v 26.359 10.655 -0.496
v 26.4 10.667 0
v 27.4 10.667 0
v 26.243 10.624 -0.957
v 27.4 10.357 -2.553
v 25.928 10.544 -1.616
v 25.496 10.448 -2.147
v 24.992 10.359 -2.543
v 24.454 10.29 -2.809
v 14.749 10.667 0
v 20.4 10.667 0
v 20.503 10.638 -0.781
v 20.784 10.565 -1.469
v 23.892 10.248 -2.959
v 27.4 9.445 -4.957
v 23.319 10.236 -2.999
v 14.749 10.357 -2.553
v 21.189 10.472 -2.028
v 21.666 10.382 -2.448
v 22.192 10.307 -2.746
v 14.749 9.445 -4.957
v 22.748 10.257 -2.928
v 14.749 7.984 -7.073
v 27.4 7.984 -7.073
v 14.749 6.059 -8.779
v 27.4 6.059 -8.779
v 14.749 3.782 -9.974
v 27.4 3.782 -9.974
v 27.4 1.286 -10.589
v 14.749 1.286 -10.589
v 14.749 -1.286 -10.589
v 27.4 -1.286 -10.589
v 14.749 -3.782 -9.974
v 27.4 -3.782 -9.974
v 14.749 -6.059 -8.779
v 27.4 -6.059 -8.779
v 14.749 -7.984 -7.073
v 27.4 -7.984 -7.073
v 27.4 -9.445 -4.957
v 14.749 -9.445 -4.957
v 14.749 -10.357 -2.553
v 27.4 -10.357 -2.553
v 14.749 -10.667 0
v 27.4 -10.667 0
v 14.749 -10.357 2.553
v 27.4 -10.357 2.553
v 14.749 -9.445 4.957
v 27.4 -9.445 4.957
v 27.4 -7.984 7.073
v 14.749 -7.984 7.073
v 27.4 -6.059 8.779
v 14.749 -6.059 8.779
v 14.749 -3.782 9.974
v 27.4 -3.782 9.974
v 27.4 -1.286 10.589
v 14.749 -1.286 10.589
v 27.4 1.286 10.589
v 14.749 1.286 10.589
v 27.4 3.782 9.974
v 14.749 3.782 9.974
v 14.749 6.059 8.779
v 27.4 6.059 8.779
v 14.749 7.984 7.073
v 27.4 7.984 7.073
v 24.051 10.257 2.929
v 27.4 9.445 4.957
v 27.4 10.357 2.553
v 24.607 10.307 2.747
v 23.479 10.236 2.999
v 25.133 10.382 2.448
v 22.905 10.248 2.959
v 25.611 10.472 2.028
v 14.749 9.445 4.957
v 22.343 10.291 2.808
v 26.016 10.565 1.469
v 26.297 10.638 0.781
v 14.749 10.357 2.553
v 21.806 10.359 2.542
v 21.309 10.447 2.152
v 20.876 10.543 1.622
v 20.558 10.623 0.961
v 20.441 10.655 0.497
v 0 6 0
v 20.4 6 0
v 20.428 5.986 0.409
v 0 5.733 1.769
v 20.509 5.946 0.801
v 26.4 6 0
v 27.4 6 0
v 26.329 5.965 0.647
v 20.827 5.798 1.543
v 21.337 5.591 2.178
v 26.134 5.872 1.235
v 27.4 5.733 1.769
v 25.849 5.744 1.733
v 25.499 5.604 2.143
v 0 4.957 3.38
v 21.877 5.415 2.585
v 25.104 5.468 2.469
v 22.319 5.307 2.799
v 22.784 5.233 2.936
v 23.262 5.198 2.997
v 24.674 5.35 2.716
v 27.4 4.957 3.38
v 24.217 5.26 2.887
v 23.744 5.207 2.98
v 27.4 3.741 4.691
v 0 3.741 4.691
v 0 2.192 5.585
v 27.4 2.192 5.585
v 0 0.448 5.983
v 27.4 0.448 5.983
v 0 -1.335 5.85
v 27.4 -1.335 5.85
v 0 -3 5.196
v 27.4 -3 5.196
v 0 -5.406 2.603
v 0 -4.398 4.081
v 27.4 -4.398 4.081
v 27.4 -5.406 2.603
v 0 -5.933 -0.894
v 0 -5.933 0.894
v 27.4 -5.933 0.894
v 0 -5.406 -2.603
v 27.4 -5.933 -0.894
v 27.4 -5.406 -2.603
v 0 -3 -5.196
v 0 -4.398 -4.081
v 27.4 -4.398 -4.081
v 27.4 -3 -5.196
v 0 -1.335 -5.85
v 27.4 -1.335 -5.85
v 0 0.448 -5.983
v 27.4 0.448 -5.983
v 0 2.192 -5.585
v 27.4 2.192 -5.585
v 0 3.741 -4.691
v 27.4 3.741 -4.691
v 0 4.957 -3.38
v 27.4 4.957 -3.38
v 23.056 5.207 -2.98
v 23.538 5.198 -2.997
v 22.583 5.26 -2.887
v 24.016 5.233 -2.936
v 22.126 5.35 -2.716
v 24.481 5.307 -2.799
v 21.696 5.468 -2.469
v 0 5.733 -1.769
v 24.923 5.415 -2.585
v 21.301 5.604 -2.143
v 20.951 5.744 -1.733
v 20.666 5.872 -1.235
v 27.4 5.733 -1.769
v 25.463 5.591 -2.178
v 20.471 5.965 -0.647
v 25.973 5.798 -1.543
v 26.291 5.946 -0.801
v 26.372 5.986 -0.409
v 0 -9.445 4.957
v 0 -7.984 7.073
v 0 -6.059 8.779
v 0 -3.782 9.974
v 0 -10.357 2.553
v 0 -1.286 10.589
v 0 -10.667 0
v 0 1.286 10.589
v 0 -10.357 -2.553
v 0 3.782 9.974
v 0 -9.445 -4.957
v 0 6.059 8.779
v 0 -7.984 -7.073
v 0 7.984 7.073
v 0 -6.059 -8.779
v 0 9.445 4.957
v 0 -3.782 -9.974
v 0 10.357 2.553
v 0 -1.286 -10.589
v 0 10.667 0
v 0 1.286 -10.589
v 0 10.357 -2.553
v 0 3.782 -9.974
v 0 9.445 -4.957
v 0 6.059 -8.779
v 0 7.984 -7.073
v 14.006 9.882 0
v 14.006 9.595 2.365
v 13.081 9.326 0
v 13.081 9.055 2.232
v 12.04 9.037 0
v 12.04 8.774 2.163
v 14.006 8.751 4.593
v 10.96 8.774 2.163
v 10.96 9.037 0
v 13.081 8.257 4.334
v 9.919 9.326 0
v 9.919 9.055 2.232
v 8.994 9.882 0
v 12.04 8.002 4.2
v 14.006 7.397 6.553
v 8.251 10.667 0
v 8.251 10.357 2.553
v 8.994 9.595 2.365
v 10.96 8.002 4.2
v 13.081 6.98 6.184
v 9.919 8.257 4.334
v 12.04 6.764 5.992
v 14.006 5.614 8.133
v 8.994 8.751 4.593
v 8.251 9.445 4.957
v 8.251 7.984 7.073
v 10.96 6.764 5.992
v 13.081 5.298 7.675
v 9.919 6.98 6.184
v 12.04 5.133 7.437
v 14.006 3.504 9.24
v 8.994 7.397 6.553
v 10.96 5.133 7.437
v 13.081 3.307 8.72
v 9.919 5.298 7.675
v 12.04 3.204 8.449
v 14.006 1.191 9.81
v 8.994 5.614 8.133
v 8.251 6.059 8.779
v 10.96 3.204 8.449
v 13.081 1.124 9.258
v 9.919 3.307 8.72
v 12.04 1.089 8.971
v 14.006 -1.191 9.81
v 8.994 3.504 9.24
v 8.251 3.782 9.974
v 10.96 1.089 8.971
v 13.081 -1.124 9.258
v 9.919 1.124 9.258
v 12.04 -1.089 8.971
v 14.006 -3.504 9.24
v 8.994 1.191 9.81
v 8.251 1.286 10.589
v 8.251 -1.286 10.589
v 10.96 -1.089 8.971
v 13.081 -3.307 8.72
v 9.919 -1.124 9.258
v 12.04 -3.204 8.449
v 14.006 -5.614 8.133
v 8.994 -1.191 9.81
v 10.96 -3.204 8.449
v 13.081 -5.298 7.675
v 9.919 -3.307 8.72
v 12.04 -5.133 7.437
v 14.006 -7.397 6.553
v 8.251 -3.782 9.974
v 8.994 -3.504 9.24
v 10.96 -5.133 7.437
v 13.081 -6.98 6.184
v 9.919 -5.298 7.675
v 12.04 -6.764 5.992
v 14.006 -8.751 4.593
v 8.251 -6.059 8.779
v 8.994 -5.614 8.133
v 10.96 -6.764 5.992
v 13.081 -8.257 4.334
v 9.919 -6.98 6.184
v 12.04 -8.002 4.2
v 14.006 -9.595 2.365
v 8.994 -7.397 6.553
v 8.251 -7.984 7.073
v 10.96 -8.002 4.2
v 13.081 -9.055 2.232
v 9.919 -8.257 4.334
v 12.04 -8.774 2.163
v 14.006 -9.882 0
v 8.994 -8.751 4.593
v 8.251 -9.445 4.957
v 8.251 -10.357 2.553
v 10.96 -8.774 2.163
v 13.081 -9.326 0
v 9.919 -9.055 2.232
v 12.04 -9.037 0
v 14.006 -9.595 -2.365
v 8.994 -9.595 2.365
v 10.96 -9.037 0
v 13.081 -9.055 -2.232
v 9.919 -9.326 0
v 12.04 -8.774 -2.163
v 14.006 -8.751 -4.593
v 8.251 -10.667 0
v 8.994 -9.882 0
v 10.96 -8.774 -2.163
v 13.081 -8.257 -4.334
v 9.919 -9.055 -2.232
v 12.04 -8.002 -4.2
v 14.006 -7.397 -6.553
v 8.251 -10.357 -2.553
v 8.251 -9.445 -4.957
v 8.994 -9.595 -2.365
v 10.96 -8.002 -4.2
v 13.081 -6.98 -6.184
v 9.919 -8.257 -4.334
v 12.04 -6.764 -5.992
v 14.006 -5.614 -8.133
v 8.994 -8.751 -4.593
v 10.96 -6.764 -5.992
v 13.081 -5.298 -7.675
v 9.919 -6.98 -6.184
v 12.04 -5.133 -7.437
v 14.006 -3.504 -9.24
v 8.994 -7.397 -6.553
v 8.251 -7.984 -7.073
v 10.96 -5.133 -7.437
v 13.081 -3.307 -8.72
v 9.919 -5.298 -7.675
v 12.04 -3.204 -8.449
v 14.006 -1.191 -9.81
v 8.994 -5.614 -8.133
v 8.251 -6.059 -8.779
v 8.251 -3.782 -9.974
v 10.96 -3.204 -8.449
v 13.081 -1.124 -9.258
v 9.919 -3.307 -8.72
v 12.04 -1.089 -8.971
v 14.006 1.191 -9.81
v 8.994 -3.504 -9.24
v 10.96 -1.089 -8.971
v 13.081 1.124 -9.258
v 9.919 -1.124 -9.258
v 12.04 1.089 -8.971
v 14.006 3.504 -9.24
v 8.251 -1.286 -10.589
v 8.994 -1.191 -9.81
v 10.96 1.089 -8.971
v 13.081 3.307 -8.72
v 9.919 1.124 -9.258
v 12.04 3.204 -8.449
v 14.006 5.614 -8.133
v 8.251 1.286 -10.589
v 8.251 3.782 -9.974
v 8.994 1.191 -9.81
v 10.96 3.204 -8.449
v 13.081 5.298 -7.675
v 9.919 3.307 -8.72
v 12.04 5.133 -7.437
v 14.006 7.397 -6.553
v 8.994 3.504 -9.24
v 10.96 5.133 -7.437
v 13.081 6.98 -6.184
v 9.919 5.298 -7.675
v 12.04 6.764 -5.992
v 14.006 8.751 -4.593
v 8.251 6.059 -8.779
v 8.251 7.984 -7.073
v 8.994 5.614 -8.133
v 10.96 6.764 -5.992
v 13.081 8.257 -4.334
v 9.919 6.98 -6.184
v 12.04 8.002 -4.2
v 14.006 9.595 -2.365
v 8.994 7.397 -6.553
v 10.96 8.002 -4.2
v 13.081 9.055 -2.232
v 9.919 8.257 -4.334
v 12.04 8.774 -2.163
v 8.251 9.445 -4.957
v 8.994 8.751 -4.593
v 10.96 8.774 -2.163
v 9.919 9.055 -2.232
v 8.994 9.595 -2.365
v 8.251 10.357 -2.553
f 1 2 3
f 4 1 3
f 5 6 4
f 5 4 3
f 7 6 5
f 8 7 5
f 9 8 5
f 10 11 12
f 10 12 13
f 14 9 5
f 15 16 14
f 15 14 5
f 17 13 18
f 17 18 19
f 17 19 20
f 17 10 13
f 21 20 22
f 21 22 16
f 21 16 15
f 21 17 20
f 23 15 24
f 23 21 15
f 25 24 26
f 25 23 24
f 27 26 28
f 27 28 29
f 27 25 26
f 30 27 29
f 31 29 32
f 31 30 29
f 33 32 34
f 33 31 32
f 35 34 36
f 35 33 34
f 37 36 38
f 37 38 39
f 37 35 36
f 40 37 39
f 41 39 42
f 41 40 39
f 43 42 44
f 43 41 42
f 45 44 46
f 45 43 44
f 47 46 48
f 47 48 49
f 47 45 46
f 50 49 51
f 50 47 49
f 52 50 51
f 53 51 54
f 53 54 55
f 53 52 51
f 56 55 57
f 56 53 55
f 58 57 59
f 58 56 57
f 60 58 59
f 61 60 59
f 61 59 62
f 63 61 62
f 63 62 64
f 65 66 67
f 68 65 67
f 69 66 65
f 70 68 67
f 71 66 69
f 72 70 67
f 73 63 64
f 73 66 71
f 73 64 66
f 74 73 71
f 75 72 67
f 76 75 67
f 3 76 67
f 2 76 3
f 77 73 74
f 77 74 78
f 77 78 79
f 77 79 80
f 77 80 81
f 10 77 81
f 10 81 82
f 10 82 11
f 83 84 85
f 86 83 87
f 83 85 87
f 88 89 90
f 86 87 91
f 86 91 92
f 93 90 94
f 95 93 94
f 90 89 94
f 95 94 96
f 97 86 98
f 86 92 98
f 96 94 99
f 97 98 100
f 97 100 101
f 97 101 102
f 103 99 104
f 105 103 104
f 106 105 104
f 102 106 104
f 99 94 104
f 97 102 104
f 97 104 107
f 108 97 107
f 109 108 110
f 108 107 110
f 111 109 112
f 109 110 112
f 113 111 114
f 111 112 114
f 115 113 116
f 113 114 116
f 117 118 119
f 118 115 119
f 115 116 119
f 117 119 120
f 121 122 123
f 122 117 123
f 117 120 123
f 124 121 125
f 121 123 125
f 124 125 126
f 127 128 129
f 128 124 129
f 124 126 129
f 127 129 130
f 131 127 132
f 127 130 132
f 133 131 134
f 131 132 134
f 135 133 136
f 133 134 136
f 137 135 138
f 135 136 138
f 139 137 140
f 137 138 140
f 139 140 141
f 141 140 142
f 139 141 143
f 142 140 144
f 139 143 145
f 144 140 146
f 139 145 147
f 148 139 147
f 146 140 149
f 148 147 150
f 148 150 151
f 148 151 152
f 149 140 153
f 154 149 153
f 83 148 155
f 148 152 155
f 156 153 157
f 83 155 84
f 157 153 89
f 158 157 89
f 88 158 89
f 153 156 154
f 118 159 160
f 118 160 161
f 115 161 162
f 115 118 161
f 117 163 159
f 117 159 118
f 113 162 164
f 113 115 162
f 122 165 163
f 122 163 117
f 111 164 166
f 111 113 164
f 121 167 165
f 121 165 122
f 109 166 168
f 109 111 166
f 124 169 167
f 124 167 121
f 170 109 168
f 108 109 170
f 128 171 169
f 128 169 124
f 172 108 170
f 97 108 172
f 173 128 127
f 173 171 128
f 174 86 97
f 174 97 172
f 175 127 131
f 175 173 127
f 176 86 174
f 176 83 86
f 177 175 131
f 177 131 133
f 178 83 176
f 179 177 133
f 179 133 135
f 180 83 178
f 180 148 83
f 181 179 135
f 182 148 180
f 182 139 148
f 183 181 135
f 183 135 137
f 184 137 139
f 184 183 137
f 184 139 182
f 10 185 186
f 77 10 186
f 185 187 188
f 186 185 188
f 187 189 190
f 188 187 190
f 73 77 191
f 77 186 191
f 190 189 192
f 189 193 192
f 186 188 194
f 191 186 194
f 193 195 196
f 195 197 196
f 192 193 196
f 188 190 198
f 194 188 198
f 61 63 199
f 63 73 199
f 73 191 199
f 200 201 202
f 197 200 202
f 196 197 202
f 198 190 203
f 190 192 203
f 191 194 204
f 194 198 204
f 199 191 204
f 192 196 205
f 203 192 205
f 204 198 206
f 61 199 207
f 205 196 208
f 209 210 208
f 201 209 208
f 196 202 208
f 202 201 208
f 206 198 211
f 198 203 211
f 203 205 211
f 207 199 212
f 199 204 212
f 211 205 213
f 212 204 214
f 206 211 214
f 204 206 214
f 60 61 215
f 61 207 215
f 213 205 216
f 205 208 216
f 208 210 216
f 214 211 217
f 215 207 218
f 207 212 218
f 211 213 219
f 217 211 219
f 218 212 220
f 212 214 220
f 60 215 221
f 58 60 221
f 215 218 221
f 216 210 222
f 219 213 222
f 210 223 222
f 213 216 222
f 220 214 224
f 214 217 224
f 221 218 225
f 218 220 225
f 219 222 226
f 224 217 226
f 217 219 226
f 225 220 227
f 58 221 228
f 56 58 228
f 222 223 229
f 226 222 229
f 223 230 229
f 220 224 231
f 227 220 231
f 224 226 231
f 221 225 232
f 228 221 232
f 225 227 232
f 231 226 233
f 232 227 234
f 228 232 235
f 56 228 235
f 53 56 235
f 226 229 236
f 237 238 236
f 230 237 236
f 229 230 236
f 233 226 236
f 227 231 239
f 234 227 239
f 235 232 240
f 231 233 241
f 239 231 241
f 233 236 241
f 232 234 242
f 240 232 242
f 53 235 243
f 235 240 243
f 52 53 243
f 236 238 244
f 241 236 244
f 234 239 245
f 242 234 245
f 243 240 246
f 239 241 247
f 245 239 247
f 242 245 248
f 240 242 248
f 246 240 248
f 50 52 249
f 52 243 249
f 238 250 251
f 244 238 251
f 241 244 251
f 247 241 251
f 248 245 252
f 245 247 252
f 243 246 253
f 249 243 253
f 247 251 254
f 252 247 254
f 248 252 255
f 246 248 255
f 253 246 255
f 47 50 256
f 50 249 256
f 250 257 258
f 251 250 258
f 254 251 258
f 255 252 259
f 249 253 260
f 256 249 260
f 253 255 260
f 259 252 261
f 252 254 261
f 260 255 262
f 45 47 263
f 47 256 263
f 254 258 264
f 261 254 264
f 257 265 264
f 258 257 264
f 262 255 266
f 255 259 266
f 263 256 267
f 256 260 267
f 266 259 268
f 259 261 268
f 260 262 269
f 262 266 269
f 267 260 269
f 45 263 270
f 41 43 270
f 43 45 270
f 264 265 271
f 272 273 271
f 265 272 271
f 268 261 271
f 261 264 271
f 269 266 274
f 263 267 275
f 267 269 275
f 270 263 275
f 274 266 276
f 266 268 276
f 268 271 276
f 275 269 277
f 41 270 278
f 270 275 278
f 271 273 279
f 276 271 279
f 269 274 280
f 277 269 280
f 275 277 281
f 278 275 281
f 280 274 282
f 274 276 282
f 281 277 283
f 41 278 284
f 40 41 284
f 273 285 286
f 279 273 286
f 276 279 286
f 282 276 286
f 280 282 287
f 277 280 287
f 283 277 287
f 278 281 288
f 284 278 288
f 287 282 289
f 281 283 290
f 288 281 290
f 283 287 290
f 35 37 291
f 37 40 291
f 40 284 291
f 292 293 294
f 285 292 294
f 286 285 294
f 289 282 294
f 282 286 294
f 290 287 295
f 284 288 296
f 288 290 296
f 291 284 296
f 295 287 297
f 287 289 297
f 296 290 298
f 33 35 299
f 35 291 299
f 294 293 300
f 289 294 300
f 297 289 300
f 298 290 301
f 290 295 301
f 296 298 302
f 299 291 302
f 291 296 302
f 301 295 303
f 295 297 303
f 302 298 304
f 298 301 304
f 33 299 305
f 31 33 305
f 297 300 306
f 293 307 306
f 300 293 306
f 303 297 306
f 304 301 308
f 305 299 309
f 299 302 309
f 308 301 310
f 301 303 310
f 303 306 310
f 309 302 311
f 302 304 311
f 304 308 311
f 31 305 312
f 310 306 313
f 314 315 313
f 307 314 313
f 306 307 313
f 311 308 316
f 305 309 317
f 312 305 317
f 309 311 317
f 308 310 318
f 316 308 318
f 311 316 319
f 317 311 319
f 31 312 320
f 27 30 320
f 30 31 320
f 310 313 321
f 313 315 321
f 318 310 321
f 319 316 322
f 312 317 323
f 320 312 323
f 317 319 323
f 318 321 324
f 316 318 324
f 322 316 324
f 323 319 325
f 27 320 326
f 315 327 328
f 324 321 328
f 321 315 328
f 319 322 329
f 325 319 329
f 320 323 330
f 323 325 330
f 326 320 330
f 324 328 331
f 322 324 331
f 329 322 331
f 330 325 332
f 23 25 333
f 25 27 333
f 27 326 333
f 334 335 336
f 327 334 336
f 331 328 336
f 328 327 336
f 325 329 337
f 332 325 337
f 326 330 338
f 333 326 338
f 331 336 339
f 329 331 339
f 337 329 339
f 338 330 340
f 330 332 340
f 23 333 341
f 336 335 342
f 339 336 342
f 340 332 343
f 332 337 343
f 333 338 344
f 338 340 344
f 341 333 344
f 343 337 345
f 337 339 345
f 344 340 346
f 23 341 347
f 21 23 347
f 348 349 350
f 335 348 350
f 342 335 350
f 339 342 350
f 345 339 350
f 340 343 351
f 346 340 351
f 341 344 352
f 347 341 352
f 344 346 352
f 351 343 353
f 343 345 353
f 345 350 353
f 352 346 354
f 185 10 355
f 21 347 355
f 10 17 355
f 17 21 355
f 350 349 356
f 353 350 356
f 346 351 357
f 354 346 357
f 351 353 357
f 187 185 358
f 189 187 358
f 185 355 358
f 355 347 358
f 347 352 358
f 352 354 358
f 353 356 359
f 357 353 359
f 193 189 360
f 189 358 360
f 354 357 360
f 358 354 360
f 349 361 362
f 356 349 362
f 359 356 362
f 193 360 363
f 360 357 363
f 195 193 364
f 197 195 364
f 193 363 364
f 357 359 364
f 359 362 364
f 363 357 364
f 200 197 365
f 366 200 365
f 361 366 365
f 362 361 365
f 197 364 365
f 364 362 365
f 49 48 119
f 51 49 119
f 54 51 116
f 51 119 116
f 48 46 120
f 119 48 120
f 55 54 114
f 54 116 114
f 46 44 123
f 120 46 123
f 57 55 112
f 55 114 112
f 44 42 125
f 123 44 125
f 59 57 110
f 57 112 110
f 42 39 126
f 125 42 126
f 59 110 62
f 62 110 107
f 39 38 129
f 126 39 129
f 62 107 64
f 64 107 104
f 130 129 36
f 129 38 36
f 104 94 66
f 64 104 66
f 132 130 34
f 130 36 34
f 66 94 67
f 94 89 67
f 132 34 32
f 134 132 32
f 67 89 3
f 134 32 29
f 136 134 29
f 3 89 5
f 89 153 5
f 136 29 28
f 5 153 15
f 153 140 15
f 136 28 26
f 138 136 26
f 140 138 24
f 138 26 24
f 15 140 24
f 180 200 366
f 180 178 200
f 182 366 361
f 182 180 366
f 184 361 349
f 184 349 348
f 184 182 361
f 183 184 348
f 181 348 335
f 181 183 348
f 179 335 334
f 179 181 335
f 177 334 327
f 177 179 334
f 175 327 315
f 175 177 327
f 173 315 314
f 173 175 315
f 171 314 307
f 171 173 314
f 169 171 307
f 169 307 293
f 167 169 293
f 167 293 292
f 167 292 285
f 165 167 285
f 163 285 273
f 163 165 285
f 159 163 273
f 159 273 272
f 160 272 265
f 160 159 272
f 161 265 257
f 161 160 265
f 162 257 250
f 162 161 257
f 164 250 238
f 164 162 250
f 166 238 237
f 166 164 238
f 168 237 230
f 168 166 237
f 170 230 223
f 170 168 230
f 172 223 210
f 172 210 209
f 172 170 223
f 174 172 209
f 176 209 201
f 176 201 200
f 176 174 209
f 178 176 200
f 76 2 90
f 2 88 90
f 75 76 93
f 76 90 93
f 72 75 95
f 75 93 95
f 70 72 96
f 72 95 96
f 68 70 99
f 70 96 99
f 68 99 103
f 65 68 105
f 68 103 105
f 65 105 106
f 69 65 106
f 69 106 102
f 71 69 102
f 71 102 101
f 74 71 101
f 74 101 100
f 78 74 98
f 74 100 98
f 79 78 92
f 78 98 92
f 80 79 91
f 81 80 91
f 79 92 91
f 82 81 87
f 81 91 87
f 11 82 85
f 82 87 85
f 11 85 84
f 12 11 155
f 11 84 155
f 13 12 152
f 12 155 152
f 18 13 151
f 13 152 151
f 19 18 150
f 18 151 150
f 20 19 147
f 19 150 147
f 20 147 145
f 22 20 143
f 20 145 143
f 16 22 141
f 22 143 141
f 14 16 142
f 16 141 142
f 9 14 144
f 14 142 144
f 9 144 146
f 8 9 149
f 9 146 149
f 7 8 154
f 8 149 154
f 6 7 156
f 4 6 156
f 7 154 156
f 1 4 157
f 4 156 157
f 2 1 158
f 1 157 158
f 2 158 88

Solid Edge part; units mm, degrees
sketch "Sketch1" plane through (0, 0, 0) normal (0, 0, 1) x (1, 0, 0)
  line L0 (0, 10.6667) -> (0, 6)
  line L1 (0, 6) -> (27.4, 6)
  line L2 (27.4, 6) -> (27.4, 10.6667)
  line L3 (27.4, 10.6667) -> (14.7489, 10.6667)
  arc A0 (14.7489, 10.6667) -> (8.2511, 10.6667) centre (11.5, 13) cw
  line L4 (8.2511, 10.6667) -> (0, 10.6667)
revolve "RevolvedProtrusion1" add sketch "Sketch1" angle 360 about axis through (27.4, 0, 0) along (-1, 0, 0)
sketch "Sketch2" plane through (0, 0, 0) normal (0, -1, 0) x (1, 0, 0)
  circle A0 centre (23.4, 0) radius 3
extrude "Cutout1" cut sketch "Sketch2" against normal blind 40
properties part number "UCP201 GB/T7810-1995_PART2"
